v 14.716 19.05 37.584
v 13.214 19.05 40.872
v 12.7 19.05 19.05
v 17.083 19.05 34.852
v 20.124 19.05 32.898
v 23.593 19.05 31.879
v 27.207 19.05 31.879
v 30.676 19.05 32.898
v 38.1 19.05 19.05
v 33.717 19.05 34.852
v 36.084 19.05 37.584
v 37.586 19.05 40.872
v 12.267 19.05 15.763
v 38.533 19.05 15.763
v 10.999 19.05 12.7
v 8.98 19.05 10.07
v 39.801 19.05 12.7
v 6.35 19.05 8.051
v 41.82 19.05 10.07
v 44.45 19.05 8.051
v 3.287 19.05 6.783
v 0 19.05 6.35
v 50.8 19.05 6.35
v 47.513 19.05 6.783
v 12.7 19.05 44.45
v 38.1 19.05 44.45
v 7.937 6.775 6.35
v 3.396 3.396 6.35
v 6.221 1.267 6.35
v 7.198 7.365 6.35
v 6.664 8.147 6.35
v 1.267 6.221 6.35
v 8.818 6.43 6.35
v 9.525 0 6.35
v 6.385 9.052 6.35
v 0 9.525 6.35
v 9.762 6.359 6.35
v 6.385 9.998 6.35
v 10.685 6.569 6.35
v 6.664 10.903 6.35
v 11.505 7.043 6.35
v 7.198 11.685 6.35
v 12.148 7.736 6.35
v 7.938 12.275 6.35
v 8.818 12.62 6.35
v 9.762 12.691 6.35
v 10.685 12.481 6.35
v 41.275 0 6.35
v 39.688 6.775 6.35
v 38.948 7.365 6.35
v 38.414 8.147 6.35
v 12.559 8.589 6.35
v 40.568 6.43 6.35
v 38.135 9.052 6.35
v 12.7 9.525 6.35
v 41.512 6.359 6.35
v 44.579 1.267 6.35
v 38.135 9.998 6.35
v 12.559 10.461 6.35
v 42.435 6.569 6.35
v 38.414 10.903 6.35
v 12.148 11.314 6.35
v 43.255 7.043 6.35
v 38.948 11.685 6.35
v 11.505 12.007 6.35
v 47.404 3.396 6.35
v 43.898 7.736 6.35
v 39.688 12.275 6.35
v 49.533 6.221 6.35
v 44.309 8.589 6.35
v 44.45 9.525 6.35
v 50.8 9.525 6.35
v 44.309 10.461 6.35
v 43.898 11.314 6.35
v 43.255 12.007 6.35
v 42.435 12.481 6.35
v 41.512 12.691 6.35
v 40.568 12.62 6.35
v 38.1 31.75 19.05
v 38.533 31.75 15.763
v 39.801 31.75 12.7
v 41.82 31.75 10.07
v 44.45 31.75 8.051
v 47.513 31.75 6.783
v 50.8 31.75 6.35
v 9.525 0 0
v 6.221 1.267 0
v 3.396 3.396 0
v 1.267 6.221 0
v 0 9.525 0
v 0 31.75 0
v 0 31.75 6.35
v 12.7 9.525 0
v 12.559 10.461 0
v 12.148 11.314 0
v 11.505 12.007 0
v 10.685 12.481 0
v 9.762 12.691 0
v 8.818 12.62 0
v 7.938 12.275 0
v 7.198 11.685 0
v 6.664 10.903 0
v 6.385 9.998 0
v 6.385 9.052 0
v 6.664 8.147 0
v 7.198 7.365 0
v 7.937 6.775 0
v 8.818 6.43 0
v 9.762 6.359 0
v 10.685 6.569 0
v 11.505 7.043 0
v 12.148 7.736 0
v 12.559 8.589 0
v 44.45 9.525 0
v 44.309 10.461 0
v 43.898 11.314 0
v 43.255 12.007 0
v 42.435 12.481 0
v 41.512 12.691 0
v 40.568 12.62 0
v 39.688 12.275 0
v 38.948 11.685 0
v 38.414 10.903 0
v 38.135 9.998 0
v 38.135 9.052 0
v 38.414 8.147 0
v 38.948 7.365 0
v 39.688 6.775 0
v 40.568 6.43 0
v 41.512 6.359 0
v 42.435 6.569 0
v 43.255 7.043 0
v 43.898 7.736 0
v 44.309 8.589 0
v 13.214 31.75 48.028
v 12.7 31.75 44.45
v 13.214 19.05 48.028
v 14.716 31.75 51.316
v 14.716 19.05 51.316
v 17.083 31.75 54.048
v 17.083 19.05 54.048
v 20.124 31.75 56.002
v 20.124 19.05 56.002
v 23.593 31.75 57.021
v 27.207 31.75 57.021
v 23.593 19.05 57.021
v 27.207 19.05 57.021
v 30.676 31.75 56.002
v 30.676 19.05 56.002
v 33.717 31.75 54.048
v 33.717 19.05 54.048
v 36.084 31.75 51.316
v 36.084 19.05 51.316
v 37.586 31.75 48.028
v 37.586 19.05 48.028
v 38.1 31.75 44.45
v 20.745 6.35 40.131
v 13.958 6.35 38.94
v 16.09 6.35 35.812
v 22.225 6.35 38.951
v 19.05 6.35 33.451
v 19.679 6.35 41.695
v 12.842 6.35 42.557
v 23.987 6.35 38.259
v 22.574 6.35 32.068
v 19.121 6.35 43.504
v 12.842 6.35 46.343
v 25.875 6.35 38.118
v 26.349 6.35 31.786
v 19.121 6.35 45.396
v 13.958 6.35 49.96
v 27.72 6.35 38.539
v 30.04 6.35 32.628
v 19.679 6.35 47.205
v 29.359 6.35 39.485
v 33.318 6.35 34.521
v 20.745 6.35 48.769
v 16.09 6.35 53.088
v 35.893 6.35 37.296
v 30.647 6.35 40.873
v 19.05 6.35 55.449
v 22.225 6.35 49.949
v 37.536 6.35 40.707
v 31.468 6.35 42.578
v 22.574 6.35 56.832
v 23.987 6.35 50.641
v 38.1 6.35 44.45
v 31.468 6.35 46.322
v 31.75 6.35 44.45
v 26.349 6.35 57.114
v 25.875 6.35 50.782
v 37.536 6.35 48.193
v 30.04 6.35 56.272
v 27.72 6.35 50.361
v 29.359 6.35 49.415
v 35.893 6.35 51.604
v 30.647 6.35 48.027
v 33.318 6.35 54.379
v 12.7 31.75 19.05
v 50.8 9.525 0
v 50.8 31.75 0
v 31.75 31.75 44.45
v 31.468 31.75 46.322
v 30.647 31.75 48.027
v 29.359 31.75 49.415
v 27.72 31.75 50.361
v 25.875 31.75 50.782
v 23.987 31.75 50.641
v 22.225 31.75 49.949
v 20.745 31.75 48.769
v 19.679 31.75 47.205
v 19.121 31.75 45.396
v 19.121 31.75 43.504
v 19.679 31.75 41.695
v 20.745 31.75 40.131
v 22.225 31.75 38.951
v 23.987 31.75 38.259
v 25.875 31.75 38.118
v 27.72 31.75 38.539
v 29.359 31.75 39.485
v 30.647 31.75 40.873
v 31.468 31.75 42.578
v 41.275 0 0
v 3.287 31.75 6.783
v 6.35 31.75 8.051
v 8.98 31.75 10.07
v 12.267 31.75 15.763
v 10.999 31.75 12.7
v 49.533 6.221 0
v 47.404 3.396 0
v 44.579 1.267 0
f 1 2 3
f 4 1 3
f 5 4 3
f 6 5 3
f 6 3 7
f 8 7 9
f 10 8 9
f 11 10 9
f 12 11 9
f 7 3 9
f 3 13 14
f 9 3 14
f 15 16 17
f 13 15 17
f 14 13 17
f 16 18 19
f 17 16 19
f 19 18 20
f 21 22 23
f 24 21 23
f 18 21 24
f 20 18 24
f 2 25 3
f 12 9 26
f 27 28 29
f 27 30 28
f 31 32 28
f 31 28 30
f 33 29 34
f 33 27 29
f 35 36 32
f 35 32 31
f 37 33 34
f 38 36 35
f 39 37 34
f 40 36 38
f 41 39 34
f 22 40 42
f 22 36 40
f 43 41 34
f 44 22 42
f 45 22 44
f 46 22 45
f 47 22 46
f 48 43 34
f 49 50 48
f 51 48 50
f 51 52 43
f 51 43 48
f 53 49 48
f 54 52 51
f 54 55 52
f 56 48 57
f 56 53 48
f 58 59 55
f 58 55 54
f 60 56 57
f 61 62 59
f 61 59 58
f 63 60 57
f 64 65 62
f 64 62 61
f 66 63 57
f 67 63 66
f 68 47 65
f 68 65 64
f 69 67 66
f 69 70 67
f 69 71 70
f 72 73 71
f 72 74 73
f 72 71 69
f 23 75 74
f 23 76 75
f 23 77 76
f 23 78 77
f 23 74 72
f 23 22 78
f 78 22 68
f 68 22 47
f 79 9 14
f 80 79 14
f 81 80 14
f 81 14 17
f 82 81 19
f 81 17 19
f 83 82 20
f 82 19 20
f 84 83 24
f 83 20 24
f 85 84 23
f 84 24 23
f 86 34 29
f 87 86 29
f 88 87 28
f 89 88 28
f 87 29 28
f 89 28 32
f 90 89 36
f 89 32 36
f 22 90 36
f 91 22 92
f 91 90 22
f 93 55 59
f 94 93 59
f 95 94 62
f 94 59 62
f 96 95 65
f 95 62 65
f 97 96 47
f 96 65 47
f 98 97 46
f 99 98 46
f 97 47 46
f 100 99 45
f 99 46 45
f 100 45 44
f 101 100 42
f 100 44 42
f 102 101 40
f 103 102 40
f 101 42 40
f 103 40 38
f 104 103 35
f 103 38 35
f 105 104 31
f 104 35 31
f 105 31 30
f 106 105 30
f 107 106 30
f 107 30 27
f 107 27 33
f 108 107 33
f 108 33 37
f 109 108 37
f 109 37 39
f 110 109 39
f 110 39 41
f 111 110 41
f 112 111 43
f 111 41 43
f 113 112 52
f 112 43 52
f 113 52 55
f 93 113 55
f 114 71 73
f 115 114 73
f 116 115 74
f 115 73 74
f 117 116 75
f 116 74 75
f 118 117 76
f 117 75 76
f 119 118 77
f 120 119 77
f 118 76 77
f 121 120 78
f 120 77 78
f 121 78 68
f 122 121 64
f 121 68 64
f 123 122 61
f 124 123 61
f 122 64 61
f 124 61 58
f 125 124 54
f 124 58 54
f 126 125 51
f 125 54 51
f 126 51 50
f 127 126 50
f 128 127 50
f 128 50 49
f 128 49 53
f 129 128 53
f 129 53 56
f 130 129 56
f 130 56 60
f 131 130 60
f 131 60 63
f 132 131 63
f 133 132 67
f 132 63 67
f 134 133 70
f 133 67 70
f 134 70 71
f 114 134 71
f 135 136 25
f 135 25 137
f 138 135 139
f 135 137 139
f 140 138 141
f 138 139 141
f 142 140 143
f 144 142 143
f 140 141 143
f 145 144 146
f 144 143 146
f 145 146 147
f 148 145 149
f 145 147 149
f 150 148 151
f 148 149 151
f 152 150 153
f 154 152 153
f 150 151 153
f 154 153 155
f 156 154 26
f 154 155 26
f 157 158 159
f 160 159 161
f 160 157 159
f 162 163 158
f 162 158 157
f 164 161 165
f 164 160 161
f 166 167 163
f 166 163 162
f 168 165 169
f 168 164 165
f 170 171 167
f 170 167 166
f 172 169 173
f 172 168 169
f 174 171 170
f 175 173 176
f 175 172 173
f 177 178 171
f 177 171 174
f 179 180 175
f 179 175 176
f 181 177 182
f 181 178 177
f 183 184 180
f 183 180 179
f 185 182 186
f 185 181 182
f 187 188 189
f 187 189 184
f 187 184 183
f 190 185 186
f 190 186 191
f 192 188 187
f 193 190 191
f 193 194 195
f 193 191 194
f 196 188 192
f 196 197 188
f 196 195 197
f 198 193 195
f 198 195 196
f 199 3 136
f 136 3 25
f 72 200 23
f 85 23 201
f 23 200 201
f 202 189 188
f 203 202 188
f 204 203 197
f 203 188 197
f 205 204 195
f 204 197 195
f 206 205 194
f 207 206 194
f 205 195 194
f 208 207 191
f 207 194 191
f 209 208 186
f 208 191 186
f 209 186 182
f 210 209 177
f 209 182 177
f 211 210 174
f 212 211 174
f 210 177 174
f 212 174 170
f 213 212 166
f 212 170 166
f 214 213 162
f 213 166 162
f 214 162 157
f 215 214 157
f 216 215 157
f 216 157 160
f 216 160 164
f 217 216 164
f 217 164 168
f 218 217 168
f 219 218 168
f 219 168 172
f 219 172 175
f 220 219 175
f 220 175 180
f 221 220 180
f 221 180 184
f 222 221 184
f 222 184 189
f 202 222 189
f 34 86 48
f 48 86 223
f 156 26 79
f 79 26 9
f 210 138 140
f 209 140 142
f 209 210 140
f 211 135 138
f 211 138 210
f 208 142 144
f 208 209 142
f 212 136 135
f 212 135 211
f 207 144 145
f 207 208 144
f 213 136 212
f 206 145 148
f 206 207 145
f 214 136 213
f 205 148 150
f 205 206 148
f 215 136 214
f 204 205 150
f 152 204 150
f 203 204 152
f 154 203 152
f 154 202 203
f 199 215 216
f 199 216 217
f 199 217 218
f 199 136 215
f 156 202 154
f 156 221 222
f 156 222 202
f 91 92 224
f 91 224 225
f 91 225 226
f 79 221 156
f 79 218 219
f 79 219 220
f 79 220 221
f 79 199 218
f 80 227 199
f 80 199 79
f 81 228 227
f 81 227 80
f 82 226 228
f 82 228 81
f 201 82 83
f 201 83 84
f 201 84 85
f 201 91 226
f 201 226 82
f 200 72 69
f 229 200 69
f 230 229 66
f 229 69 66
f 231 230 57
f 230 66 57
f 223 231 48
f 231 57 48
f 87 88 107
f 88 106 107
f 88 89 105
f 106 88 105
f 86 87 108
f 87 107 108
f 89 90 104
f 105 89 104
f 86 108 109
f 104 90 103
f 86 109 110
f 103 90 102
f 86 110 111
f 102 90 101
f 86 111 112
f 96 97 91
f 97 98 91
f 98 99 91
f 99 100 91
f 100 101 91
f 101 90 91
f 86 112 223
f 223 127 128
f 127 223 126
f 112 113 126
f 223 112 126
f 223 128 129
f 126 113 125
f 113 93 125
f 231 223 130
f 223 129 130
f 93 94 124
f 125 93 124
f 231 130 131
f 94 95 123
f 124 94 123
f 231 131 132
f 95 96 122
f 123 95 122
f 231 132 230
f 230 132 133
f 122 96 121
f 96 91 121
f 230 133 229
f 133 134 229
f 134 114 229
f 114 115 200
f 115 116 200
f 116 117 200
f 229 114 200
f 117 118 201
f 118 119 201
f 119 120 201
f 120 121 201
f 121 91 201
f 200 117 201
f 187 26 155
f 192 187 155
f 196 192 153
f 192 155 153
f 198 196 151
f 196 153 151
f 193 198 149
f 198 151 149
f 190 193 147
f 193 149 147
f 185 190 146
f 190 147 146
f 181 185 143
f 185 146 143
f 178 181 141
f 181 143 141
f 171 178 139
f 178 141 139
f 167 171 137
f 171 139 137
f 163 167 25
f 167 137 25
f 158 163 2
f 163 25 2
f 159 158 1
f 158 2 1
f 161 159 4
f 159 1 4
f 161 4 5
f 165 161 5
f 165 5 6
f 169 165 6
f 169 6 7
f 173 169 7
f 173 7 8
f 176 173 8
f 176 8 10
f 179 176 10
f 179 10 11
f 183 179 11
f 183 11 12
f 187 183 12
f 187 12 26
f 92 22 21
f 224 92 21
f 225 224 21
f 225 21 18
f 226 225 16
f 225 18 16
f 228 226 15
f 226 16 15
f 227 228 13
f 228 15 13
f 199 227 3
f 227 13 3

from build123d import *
from build123d import SkipClean  # not in build123d's __all__

# Parameters (mm, degrees)
F0_W      = 50.8
F0_H      = 31.75
F1_DEPTH  = 6.35
F2_R      = 3.175
F3_DEPTH  = 6.35
F4_W      = 50.8
F4_H      = 12.7
F5_DEPTH  = 57.15
F7_DEPTH  = 12.7
F8_DEPTH  = 12.7
F9_R      = 6.35
F10_DEPTH = 38.1


with BuildPart() as f1:
    # F0 (on Top) → F1 (new body)
    with BuildSketch(Plane.XY):
        with Locations((25.4, 15.875)):
            Rectangle(F0_W, F0_H)
    extrude(amount=F1_DEPTH)

    # F2 (on face) → F3 (cut)
    with BuildSketch(Plane.XY.offset(6.35)):
        with Locations((41.275, 9.525)):
            Circle(F2_R)
        with Locations((9.525, 9.525)):
            Circle(F2_R)
        with BuildLine():
            ThreePointArc((9.525, 0), (3.3956264222, 3.3956264222), (0, 9.525))
            Line((0, 9.525), (0, 0))
            Line((0, 0), (9.525, 0))
        make_face()
        with BuildLine():
            ThreePointArc((50.8, 9.525), (47.4043735778, 3.3956264222), (41.275, 0))
            Line((41.275, 0), (50.8, 0))
            Line((50.8, 0), (50.8, 9.525))
        make_face()
    extrude(amount=-F3_DEPTH, mode=Mode.SUBTRACT)

    # F4 (on face) → F5 (join)
    with BuildSketch(Plane.XY.offset(6.35)):
        with Locations((25.4, 25.4)):
            Rectangle(F4_W, F4_H)
    extrude(amount=F5_DEPTH)

    # F6 (on face) → F7 (cut)
    with BuildSketch(Plane.XZ.offset(-19.05)):
        with BuildLine():
            ThreePointArc((12.7, 44.45), (25.4, 57.15), (38.1, 44.45))
            Line((38.1, 44.45), (38.1, 19.05))
            ThreePointArc((38.1, 19.05), (41.8197438789, 10.0697438789), (50.8, 6.35))
            Line((50.8, 6.35), (50.8, 63.5))
            Line((50.8, 63.5), (0, 63.5))
            Line((0, 63.5), (0, 6.35))
            ThreePointArc((0, 6.35), (8.9802561211, 10.0697438789), (12.7, 19.05))
            Line((12.7, 19.05), (12.7, 44.45))
        make_face()
    extrude(amount=-F7_DEPTH, mode=Mode.SUBTRACT)

    # F6 (on face) → F8 (join)
    with BuildSketch(Plane.XZ.offset(-19.05)):
        with BuildLine():
            ThreePointArc((12.7, 44.45), (25.4, 31.75), (38.1, 44.45))
            ThreePointArc((38.1, 44.45), (25.4, 57.15), (12.7, 44.45))
        make_face()
    with SkipClean():  # cleaning this boolean's faces spoils the solid; the shape is the same uncleaned
        extrude(amount=F8_DEPTH)

    # F9 (on face) → F10 (cut)
    with BuildSketch(Plane.XZ.offset(-6.35)):
        with Locations((25.4, 44.45)):
            Circle(F9_R)
    with SkipClean():  # cleaning this boolean's faces spoils the solid; the shape is the same uncleaned
        extrude(amount=-F10_DEPTH, mode=Mode.SUBTRACT)


solid = f1.part
